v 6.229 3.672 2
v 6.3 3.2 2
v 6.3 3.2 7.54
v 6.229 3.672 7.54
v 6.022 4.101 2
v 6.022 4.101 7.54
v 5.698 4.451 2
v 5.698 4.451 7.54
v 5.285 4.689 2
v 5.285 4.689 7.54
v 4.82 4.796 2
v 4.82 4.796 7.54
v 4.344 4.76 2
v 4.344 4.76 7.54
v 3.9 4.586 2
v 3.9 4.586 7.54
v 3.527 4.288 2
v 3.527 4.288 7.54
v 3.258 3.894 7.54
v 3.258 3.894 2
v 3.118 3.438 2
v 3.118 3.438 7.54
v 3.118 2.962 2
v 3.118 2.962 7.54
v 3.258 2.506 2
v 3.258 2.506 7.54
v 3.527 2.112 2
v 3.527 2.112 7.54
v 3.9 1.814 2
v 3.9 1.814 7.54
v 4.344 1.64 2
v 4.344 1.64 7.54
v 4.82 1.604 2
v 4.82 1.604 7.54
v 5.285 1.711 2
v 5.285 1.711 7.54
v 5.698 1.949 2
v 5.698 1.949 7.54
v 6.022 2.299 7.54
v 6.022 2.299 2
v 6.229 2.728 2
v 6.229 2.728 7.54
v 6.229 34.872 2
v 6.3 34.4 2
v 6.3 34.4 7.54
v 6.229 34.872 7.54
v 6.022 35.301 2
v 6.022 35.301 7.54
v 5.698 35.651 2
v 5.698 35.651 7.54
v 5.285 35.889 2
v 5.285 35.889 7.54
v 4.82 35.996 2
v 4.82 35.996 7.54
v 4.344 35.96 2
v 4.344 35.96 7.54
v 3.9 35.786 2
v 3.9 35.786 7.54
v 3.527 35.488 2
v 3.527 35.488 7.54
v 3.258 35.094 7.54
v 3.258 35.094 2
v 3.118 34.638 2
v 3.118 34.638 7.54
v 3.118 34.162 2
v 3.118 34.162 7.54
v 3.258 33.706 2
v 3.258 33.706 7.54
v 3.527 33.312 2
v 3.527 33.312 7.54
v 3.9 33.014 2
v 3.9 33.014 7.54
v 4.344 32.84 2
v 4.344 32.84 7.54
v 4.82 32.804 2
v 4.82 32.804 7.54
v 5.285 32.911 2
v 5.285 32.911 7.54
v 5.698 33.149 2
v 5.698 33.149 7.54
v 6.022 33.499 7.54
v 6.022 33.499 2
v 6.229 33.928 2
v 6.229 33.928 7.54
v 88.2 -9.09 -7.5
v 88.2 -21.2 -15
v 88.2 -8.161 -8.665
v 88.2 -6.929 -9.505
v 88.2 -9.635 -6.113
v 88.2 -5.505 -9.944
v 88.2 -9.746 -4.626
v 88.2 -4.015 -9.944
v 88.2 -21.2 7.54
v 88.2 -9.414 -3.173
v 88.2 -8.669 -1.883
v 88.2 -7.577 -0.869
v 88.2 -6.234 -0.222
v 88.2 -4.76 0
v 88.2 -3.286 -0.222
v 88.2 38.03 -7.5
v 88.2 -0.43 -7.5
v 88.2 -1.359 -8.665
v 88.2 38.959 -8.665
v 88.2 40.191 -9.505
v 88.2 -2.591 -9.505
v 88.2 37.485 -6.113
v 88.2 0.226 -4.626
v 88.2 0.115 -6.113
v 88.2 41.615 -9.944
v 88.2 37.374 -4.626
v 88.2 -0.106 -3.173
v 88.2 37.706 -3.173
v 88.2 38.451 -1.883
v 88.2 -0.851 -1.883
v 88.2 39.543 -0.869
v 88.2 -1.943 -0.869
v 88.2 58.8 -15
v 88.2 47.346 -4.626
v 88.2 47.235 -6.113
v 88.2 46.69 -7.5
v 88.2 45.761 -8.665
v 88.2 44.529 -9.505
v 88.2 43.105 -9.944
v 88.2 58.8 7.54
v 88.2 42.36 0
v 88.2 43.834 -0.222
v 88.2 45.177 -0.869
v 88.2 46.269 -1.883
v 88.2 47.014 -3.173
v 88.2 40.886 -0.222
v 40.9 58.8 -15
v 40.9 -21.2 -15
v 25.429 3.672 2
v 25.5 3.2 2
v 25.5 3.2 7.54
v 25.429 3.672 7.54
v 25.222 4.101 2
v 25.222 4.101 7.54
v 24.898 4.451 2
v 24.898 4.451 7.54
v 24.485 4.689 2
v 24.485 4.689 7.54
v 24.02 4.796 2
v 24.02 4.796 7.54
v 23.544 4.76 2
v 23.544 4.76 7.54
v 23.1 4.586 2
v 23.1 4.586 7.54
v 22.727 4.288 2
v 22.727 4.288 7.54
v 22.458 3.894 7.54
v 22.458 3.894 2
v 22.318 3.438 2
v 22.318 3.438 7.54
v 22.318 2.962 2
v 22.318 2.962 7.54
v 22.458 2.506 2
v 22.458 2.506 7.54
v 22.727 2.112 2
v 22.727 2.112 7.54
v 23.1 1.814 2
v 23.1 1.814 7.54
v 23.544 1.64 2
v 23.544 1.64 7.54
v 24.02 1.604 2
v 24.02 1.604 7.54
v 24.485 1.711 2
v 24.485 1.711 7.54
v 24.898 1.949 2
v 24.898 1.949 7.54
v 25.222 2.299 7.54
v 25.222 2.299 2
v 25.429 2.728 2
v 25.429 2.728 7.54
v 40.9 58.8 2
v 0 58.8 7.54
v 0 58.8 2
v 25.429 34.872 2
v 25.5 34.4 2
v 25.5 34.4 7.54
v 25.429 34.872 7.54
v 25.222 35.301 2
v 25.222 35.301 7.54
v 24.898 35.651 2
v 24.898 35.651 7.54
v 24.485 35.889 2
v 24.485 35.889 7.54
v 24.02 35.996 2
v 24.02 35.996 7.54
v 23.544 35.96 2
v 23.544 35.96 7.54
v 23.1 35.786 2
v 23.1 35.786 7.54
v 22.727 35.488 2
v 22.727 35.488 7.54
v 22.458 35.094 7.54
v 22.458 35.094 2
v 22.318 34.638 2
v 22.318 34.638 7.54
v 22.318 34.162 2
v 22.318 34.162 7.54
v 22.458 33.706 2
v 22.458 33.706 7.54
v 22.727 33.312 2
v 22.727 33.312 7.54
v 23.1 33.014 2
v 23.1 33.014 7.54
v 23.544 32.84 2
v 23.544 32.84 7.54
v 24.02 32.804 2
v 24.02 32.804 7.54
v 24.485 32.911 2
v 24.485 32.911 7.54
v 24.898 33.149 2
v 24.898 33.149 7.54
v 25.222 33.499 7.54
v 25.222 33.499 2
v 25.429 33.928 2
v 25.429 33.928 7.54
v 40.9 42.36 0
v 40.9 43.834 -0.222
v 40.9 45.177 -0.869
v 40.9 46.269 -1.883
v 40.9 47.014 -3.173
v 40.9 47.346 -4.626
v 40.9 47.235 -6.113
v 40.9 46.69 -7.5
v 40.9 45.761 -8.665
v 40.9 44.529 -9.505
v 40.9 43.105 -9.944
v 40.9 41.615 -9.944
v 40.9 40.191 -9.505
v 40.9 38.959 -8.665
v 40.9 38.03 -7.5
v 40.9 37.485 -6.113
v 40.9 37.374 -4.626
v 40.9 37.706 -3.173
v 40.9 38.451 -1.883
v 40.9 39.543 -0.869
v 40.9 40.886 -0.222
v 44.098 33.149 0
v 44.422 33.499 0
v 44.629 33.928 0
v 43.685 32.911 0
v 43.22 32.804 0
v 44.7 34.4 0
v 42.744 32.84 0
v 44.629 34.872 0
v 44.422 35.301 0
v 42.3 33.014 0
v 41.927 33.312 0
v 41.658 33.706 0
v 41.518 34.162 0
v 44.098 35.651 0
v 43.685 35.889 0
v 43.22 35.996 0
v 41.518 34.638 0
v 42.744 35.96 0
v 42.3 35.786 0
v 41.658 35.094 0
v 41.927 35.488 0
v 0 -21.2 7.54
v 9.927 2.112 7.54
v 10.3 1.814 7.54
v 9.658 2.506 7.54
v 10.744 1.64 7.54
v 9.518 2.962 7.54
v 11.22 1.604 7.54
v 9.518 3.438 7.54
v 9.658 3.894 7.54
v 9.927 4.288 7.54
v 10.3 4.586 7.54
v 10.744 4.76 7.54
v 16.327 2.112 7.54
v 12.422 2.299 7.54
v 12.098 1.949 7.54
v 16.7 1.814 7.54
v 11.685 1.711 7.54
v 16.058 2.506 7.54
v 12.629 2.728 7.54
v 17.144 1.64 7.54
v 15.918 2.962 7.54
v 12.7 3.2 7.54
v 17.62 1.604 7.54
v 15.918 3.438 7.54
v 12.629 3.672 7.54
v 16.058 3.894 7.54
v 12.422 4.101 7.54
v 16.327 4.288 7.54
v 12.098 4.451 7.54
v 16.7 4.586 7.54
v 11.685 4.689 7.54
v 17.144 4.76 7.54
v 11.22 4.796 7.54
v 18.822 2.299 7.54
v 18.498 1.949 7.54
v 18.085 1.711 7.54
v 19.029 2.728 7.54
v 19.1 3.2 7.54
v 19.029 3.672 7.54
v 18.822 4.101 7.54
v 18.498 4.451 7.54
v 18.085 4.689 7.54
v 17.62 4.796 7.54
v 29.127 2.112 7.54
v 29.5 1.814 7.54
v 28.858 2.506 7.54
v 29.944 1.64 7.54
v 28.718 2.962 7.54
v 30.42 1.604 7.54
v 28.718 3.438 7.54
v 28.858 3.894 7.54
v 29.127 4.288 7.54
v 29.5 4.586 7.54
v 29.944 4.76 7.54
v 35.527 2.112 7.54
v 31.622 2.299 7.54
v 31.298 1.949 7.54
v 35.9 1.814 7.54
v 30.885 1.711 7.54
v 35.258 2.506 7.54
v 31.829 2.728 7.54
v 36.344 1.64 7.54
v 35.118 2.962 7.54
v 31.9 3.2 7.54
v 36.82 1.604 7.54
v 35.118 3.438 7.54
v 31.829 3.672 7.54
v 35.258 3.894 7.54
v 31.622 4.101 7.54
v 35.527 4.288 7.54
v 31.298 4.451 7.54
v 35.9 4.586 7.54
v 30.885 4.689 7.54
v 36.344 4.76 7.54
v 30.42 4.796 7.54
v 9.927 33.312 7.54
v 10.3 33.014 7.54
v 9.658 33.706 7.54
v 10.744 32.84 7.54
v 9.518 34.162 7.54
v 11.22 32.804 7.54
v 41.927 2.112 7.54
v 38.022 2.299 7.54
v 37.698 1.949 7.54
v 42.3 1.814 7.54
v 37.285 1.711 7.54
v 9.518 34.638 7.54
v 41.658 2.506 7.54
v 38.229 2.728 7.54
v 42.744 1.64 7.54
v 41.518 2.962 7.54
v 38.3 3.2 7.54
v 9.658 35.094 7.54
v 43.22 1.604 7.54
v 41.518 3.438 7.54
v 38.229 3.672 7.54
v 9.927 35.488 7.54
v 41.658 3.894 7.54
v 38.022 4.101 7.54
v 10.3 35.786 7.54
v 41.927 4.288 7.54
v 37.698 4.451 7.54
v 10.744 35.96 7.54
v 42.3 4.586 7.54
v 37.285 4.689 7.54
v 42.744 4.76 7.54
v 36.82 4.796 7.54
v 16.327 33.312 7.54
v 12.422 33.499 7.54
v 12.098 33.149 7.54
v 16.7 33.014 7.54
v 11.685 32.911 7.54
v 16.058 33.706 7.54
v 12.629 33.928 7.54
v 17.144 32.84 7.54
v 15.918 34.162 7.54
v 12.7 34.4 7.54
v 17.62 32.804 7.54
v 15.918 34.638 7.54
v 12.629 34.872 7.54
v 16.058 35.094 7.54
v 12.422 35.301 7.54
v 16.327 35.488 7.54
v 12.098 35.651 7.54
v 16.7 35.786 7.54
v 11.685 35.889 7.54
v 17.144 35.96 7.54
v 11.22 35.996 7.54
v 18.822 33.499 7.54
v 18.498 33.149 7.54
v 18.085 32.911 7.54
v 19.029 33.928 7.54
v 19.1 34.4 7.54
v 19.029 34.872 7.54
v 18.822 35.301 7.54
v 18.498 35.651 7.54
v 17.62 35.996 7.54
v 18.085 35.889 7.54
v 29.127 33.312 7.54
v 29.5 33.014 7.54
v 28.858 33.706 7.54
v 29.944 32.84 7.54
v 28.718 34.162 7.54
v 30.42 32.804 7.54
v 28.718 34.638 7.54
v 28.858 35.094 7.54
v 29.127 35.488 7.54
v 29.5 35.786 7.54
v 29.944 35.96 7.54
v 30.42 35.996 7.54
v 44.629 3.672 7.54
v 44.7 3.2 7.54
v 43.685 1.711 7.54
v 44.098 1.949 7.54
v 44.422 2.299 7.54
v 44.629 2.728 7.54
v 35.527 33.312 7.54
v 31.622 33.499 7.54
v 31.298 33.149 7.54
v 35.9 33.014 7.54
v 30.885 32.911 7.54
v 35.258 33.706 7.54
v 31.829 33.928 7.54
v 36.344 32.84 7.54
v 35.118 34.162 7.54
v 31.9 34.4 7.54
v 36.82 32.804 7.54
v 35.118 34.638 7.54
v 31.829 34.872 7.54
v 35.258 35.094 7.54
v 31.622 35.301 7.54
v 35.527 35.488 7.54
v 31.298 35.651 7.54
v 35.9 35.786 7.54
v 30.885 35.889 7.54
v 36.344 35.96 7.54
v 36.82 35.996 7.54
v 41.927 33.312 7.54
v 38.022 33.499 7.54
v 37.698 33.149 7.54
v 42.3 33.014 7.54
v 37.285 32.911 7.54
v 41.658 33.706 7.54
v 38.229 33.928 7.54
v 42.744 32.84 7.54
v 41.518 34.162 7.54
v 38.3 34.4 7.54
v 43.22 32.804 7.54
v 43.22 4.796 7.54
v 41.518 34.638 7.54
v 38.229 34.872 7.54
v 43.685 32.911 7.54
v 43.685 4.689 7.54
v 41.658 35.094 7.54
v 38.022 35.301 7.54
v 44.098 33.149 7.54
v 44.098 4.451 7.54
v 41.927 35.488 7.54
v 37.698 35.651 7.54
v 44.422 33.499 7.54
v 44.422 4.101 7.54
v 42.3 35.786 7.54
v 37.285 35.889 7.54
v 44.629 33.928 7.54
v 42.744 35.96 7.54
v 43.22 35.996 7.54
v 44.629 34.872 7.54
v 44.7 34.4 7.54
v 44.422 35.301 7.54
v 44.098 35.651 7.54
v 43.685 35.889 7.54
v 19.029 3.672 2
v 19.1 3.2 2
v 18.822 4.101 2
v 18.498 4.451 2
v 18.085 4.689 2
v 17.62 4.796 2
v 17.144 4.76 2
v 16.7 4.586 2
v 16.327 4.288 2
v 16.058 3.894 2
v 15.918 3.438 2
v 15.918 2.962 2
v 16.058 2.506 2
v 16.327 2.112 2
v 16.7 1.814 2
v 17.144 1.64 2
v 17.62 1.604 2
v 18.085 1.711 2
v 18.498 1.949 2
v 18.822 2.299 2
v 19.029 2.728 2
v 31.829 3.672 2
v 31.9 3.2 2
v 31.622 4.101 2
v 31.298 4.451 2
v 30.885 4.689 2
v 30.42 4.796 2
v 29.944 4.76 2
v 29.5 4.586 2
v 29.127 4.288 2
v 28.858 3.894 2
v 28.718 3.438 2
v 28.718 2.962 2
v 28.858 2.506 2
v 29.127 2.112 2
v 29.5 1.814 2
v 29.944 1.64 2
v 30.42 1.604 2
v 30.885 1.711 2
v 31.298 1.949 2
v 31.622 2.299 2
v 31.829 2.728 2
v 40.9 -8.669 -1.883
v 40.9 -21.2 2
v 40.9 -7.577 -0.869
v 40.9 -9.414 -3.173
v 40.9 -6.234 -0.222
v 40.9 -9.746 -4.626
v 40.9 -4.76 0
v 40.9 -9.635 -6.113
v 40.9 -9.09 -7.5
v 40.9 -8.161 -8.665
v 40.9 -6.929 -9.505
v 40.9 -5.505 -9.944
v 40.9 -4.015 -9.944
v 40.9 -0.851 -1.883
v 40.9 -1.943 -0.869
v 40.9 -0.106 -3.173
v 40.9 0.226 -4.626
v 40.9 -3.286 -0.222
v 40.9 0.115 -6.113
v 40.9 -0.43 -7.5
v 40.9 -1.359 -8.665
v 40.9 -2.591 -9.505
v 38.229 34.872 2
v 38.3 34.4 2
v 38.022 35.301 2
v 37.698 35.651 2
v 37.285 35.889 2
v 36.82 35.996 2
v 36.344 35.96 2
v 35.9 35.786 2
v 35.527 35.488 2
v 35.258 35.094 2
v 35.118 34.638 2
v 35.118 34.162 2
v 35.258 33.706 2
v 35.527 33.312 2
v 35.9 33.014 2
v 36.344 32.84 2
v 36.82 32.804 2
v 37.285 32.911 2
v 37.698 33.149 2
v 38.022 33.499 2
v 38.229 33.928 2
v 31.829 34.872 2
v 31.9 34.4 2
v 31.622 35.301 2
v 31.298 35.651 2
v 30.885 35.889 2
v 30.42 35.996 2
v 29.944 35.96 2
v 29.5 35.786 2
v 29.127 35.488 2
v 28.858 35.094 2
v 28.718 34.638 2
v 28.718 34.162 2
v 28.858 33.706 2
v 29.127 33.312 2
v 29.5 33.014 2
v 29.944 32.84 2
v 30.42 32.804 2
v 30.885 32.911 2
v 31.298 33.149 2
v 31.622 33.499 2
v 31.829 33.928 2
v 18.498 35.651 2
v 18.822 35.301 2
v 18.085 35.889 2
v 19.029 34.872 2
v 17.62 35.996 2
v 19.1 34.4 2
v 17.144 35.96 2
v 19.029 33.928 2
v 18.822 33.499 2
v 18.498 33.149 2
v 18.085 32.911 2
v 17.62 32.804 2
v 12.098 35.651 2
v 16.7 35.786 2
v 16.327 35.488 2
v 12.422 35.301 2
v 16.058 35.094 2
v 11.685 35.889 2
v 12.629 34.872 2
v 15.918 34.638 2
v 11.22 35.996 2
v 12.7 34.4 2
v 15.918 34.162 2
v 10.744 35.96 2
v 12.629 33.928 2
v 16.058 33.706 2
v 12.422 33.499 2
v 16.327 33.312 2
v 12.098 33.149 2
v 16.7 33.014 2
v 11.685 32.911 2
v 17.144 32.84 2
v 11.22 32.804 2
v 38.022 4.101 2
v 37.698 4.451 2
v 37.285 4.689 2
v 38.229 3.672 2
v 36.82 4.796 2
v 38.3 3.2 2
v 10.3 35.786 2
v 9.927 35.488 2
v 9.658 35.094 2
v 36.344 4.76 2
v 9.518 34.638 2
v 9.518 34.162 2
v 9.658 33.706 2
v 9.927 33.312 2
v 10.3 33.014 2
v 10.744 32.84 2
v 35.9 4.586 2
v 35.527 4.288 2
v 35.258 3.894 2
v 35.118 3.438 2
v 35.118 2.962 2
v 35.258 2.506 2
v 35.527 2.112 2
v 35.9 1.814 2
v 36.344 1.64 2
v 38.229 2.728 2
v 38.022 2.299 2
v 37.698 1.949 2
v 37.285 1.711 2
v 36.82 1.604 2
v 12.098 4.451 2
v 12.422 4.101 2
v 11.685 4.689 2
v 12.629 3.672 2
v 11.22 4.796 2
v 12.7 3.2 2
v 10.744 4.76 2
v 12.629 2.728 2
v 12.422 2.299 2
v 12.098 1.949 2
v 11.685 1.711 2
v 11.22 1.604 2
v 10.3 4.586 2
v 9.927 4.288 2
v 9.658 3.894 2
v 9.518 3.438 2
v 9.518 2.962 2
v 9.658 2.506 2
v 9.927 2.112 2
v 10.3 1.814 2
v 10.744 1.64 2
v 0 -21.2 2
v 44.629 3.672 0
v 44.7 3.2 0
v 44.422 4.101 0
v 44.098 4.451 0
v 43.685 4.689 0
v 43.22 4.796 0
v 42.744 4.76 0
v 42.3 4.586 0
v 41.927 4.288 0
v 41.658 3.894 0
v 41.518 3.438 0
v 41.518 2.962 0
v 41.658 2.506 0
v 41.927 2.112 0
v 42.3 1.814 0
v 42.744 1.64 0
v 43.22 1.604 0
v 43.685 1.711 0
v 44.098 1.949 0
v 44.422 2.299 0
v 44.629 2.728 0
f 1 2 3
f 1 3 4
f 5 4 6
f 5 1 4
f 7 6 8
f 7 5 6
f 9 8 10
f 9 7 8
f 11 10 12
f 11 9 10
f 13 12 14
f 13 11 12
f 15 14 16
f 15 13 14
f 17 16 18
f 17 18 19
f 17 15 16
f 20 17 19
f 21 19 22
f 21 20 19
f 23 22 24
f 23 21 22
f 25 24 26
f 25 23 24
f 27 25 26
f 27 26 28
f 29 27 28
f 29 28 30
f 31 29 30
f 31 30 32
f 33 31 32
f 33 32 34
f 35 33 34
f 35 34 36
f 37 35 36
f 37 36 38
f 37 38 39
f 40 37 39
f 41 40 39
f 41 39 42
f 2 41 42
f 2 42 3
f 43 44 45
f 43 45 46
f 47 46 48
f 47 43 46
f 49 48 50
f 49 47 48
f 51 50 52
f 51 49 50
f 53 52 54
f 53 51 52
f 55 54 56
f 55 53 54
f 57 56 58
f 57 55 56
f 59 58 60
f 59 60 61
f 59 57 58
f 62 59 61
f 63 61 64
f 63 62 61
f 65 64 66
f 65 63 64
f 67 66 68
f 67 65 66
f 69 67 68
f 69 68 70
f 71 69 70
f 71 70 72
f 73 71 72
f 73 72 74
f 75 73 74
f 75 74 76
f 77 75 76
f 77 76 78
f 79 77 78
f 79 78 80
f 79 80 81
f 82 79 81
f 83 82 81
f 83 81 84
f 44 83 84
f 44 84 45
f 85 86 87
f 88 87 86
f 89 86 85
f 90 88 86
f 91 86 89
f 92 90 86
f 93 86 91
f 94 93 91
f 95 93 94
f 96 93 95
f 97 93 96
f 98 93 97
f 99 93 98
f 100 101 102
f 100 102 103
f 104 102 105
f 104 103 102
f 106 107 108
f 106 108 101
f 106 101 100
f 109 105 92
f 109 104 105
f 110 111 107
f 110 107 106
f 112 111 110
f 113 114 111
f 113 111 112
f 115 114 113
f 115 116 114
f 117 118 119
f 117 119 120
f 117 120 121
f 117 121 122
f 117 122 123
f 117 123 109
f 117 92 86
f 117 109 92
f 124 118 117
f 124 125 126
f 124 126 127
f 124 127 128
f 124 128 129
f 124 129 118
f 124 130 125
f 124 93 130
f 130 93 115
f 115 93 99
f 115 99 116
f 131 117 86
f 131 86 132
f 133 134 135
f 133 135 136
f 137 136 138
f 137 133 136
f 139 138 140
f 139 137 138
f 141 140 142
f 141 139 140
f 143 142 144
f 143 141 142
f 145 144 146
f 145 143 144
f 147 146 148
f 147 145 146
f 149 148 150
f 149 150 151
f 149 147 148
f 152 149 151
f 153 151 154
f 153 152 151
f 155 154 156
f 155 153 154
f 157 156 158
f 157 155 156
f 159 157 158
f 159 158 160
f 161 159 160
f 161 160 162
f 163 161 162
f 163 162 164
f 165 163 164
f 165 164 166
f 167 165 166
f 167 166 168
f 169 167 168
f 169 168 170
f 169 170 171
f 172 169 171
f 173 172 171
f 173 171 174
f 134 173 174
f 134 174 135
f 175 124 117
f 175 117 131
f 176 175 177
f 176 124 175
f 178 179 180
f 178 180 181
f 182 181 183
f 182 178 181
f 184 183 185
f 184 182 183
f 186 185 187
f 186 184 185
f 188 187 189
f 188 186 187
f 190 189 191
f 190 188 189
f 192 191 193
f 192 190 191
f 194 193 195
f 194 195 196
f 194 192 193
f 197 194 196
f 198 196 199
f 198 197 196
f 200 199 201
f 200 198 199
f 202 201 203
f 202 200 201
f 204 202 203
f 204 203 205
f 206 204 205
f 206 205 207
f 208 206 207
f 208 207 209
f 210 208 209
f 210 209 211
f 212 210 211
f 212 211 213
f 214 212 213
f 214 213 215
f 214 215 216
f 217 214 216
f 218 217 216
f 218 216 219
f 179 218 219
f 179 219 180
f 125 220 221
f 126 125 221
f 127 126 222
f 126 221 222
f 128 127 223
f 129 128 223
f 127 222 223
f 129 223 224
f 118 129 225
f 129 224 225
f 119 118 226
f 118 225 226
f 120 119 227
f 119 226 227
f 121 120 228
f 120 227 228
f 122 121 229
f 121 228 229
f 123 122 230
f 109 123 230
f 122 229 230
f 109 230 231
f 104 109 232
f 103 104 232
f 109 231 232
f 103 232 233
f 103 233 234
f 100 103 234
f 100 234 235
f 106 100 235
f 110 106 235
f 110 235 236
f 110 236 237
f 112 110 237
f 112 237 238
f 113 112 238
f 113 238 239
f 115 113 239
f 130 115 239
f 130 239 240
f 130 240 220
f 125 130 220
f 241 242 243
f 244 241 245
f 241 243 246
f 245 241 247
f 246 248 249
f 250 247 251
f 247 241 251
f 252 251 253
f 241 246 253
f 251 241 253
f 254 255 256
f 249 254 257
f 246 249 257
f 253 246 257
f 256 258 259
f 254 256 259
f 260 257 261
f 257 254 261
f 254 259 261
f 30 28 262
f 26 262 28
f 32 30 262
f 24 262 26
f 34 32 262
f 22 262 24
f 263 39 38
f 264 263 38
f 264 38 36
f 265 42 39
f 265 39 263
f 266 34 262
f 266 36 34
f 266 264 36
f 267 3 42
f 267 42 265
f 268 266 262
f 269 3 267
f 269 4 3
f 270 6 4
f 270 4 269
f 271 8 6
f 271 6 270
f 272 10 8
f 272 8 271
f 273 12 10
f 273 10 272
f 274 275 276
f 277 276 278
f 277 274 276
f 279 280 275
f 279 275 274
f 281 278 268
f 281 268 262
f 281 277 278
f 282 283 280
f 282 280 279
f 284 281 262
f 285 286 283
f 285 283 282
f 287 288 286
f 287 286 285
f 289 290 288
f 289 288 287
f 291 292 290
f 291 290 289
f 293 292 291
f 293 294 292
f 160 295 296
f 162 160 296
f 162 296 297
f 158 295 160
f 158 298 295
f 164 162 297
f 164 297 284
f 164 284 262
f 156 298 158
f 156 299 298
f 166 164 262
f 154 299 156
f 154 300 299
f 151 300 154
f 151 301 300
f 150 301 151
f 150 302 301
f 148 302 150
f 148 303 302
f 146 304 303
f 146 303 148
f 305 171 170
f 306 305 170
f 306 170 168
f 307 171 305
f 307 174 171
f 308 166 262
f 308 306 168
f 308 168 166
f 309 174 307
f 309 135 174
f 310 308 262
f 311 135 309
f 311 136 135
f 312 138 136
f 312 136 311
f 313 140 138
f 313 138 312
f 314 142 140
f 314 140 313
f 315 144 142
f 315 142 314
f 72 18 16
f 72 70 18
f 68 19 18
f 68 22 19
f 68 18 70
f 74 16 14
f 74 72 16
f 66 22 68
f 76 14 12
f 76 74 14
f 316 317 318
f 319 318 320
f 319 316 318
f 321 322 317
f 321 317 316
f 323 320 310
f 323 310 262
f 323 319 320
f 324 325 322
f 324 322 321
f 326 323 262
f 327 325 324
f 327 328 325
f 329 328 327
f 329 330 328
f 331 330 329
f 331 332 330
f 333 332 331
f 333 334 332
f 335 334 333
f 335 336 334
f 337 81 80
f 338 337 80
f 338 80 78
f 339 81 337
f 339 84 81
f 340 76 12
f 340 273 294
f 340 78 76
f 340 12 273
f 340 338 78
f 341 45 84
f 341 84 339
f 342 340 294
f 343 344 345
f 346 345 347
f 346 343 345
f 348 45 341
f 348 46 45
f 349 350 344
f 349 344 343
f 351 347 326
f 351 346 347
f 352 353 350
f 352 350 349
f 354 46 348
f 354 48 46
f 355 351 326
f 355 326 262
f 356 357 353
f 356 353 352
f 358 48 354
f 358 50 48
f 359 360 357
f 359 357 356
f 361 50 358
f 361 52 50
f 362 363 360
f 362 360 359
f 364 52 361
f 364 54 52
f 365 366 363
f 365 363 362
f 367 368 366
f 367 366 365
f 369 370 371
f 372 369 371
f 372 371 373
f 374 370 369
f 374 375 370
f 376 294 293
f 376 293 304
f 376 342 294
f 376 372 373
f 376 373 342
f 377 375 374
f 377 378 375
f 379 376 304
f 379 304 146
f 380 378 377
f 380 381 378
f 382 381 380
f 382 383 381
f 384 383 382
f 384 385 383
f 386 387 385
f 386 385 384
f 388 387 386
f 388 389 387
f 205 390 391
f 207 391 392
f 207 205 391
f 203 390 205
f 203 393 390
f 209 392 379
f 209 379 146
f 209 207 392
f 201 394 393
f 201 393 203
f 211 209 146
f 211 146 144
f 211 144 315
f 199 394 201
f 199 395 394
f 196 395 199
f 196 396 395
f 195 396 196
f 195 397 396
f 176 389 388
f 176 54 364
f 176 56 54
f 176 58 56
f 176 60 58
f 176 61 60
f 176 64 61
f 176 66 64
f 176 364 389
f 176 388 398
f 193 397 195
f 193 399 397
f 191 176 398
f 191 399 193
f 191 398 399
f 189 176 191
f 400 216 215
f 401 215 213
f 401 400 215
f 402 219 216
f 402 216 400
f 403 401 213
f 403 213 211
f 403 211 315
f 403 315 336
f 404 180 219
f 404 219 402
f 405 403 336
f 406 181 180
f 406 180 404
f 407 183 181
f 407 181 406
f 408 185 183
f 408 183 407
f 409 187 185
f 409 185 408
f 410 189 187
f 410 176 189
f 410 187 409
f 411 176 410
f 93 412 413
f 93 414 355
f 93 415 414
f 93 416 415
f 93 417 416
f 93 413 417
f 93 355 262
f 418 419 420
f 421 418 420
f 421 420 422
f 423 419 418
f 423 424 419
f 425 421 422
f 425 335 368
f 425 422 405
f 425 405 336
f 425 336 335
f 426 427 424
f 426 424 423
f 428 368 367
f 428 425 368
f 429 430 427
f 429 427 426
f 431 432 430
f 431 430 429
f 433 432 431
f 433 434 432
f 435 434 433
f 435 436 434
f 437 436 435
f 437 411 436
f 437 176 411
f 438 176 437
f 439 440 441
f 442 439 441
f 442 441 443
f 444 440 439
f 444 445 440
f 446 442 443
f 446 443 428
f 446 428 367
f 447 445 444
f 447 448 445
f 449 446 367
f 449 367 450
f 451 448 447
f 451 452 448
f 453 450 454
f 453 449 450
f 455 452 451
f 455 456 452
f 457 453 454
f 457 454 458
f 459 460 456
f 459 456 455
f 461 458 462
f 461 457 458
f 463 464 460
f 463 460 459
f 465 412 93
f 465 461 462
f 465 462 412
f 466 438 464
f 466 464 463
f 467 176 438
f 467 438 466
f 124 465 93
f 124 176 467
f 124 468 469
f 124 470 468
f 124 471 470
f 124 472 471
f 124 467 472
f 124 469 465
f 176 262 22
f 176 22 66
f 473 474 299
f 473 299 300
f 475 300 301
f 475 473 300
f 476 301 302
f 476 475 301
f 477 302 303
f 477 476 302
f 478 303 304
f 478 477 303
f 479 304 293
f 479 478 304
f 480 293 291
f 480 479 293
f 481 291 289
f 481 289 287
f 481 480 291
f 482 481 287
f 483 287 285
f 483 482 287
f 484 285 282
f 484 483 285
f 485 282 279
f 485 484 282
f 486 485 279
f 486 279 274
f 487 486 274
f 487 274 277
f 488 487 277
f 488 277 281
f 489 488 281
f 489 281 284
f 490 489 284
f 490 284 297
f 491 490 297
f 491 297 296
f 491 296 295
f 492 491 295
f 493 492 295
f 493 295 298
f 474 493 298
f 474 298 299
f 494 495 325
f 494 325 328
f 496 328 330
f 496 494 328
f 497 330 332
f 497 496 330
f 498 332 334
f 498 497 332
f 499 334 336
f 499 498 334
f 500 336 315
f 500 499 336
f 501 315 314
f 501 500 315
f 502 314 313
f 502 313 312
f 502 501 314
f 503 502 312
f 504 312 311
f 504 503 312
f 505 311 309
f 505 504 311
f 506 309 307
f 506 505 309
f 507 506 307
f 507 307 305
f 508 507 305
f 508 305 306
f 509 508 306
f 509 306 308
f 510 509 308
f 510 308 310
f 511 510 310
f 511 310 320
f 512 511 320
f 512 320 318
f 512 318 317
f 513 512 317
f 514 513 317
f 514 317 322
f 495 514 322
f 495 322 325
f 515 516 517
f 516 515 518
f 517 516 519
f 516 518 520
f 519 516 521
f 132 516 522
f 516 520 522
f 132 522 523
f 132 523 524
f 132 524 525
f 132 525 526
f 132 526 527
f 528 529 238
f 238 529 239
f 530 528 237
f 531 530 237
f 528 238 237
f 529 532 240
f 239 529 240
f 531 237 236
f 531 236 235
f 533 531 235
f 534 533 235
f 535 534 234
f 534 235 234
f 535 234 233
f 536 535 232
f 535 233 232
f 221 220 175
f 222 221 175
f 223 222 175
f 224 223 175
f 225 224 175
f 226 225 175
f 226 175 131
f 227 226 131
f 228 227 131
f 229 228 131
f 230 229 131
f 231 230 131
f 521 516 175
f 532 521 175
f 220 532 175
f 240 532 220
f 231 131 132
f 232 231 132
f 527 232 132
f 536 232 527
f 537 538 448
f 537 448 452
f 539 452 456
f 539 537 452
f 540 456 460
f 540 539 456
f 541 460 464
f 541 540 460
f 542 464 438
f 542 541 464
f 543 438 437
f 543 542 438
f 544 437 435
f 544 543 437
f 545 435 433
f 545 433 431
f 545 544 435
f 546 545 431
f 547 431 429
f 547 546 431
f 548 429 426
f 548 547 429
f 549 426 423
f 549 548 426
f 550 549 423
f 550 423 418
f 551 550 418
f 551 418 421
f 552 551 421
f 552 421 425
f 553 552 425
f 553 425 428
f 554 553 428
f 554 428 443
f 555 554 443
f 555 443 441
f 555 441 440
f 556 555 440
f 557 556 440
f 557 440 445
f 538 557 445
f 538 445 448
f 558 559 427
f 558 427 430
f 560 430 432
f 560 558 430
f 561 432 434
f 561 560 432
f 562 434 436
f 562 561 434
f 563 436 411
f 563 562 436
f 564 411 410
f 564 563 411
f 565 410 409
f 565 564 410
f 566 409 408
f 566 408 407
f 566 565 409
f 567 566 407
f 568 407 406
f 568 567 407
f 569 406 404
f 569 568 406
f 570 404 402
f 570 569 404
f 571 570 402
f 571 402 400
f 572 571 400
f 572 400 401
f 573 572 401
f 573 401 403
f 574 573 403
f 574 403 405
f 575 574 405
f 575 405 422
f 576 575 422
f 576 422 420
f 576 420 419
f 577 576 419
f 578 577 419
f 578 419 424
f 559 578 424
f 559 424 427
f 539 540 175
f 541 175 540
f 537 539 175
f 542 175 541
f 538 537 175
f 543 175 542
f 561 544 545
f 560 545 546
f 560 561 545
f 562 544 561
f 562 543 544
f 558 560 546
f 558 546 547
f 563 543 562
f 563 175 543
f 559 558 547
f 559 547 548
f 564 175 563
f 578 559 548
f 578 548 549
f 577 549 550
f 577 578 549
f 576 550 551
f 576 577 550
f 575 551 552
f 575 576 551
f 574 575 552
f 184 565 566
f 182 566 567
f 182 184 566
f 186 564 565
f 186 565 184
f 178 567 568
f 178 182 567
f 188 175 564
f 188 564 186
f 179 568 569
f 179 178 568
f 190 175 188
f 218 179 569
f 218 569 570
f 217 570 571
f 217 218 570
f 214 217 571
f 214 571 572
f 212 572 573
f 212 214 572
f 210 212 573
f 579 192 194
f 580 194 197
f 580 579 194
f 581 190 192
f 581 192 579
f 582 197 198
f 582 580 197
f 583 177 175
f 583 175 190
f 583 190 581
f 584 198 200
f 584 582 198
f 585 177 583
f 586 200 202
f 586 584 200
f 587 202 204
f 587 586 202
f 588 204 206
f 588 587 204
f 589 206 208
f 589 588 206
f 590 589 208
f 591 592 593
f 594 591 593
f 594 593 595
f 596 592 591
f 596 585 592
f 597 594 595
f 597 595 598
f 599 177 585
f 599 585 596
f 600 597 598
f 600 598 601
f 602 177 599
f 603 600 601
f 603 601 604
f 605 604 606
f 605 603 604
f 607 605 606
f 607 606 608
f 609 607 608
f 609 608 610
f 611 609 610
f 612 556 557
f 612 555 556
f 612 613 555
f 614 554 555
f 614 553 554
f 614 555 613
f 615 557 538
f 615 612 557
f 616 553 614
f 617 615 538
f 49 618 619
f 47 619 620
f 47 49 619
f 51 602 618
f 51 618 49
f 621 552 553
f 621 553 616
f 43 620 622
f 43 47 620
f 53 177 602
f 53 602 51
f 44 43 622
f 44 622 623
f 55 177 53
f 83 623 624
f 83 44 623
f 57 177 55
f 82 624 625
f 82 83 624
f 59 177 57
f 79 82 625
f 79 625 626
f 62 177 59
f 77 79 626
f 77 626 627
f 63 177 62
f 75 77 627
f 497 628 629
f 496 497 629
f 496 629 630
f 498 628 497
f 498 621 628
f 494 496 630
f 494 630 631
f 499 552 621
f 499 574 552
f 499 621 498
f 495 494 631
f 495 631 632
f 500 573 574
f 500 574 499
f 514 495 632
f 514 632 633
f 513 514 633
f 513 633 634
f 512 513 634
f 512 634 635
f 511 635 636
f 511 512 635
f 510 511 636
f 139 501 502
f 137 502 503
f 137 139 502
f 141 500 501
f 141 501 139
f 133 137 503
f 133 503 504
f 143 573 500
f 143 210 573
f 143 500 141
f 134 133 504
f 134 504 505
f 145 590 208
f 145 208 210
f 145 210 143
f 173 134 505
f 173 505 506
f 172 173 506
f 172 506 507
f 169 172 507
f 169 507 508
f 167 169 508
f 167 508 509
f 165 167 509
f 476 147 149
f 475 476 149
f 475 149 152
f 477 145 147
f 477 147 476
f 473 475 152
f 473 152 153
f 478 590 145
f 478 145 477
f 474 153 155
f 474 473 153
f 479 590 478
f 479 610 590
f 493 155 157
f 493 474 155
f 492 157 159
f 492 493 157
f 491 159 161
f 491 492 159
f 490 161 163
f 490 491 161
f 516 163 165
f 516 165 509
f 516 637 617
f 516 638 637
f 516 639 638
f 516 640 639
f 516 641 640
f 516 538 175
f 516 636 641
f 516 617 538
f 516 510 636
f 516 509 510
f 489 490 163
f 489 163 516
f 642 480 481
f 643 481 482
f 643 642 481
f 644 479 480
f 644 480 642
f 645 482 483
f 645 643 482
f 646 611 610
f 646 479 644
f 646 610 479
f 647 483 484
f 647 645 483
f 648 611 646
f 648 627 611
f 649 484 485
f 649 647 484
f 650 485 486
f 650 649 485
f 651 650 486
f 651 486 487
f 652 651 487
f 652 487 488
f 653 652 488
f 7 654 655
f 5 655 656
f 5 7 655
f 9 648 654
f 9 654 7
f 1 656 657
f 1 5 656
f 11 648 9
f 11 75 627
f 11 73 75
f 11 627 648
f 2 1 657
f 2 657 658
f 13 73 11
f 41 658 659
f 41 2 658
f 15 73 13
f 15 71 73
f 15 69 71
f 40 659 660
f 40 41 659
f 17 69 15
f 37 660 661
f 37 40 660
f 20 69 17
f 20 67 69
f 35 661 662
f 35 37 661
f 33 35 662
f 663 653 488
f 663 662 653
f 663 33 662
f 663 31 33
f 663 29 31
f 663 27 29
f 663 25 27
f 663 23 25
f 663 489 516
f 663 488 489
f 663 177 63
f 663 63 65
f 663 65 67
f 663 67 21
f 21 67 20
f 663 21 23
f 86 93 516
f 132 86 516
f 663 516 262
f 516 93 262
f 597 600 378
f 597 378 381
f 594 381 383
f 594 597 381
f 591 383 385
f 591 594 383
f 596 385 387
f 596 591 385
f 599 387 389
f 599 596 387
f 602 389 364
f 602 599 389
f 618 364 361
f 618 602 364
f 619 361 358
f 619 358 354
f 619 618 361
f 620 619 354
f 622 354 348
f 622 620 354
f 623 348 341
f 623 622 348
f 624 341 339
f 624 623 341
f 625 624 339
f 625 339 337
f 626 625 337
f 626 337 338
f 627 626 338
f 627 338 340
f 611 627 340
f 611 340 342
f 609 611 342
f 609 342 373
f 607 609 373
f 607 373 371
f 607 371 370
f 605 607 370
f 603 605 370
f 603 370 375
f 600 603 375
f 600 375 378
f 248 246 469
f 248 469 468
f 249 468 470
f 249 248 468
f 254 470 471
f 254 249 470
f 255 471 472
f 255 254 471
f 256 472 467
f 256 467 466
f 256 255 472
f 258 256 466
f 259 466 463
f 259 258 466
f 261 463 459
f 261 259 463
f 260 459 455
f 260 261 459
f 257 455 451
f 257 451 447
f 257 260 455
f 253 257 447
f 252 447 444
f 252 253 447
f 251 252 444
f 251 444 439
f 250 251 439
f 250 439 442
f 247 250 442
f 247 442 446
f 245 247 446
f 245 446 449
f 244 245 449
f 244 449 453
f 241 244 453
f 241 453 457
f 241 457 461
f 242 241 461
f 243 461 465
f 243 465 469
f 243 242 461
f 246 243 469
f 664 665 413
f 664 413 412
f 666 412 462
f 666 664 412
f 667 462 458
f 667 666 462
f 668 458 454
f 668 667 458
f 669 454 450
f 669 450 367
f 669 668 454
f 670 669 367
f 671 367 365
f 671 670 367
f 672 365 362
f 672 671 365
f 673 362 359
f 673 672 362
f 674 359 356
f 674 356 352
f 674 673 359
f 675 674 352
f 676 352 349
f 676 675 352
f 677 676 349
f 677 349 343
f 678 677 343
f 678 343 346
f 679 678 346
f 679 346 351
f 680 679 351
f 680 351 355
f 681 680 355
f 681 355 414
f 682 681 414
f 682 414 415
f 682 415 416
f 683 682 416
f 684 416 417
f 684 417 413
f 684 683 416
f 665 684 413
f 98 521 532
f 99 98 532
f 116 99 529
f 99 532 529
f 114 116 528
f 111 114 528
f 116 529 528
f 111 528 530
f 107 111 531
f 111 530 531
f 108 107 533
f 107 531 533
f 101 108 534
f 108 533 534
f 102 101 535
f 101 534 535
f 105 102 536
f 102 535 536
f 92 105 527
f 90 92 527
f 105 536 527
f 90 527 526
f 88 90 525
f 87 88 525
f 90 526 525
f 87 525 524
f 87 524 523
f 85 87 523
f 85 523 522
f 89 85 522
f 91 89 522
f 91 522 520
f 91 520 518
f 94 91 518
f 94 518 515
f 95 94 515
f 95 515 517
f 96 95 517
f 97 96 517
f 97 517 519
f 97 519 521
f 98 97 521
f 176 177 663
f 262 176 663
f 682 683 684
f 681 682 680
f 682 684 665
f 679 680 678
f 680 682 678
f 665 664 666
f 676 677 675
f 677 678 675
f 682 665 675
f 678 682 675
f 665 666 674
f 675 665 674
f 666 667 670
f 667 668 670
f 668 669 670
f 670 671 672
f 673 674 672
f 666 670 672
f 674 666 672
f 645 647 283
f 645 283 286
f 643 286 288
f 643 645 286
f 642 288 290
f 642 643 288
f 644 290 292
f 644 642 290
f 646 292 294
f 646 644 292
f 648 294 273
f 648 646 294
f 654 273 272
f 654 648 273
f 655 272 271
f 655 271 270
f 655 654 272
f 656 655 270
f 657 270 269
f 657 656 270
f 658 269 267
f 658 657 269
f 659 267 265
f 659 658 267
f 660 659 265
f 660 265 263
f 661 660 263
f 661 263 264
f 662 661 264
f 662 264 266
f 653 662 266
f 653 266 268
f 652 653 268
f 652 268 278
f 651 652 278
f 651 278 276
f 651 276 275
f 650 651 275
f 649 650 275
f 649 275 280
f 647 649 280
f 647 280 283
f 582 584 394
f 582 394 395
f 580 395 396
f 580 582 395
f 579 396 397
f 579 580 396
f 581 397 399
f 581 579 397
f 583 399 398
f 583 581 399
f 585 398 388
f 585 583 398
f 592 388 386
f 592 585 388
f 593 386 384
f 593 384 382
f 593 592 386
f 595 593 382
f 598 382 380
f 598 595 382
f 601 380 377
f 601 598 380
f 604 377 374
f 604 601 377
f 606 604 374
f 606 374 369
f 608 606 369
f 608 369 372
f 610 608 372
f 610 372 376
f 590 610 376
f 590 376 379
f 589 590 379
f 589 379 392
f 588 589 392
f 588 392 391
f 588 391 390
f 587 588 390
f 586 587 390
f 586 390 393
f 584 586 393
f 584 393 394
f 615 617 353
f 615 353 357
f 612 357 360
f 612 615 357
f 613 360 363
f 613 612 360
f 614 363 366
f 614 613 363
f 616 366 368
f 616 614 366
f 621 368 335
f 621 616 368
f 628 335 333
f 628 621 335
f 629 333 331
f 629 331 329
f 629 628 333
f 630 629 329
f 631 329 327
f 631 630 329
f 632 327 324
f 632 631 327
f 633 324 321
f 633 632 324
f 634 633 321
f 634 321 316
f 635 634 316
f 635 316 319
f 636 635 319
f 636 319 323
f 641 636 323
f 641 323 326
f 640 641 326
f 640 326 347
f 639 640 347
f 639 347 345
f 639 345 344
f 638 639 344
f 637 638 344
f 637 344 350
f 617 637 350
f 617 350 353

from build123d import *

# Parameters (mm, degrees)
CROQUIS1_R              = 1.6
SALIENTE_EXTRUIR3_DEPTH = 7.54
CROQUIS3_W              = 48.3
CROQUIS3_H              = 80
SALIENTE_EXTRUIR4_DEPTH = 15
CORTAR_EXTRUIR1_DEPTH   = 40.9
CROQUIS5_R              = 5
CORTAR_EXTRUIR2_DEPTH   = 54.9


with BuildPart() as part:
    # Croquis1 → Saliente-Extruir3 (new body)
    with BuildSketch(Plane.XY):
        Polygon((88.2, 0), (88.2, 37.6), (88.2, 58.8), (0, 58.8), (0, 37.6), (0, 0), (0, -21.2), (88.2, -21.2), align=None)
        with Locations((4.7, 34.4)):
            Circle(CROQUIS1_R, mode=Mode.SUBTRACT)
        with Locations((11.1, 34.4)):
            Circle(CROQUIS1_R, mode=Mode.SUBTRACT)
        with Locations((17.5, 34.4)):
            Circle(CROQUIS1_R, mode=Mode.SUBTRACT)
        with Locations((23.9, 34.4)):
            Circle(CROQUIS1_R, mode=Mode.SUBTRACT)
        with Locations((30.3, 34.4)):
            Circle(CROQUIS1_R, mode=Mode.SUBTRACT)
        with Locations((36.7, 34.4)):
            Circle(CROQUIS1_R, mode=Mode.SUBTRACT)
        with Locations((43.1, 34.4)):
            Circle(CROQUIS1_R, mode=Mode.SUBTRACT)
        with Locations((43.1, 3.2)):
            Circle(CROQUIS1_R, mode=Mode.SUBTRACT)
        with Locations((36.7, 3.2)):
            Circle(CROQUIS1_R, mode=Mode.SUBTRACT)
        with Locations((30.3, 3.2)):
            Circle(CROQUIS1_R, mode=Mode.SUBTRACT)
        with Locations((23.9, 3.2)):
            Circle(CROQUIS1_R, mode=Mode.SUBTRACT)
        with Locations((17.5, 3.2)):
            Circle(CROQUIS1_R, mode=Mode.SUBTRACT)
        with Locations((11.1, 3.2)):
            Circle(CROQUIS1_R, mode=Mode.SUBTRACT)
        with Locations((4.7, 3.2)):
            Circle(CROQUIS1_R, mode=Mode.SUBTRACT)
    extrude(amount=SALIENTE_EXTRUIR3_DEPTH)

    # Croquis3 → Saliente-Extruir4 (add)
    with BuildSketch(Plane(origin=(0, 0, 0), x_dir=(-1, 0, 0), z_dir=(0, 0, -1))):
        with Locations((-64.05, 18.8)):
            Rectangle(CROQUIS3_W, CROQUIS3_H)
    extrude(amount=SALIENTE_EXTRUIR4_DEPTH)

    # Croquis6 → Cortar-Extruir1 (cut)
    with BuildSketch(Plane.ZY):
        Polygon((0, 58.8), (2, 58.8), (2, -21.2), (0, -21.2), (-15, -21.2), (-15, 58.8), align=None)
    extrude(amount=-CORTAR_EXTRUIR1_DEPTH, mode=Mode.SUBTRACT)

    # Croquis5 → Cortar-Extruir2 (cut)
    with BuildSketch(Plane.ZY.offset(-39.9)):
        with Locations((-5, 42.36)):
            Circle(CROQUIS5_R)
        with Locations((-5, -4.76)):
            Circle(CROQUIS5_R)
    extrude(amount=-CORTAR_EXTRUIR2_DEPTH, mode=Mode.SUBTRACT)


solid = part.part
